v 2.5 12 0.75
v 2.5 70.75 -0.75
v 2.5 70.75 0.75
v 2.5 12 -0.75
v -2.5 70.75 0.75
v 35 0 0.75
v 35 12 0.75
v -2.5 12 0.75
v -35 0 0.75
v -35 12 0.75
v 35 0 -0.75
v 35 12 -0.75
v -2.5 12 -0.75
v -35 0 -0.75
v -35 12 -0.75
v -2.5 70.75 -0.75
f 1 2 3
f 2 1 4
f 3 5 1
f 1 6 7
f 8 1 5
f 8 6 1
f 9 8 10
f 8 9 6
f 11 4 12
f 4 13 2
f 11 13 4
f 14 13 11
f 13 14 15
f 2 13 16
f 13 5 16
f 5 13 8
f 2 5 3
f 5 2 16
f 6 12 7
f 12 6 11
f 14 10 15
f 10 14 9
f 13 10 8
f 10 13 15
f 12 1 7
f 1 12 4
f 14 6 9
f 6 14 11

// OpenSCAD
// Dimensions for the 10-well agarose gel comb
// All units in millimetres

// Overall Geometry
plate_thickness = 1.5;   // Thickness of the flat plate (Z)
spine_length = 70;       // Length of the spine (X)
spine_width = 12;        // Width of the spine (Y)

// Tooth Geometry
tooth_width = 5.0;       // Width of a single tooth (X)
tooth_length = 12;       // Length of a single tooth (Y)
tooth_gap = 1.5;         // Gap between neighbouring teeth (Y)

// Positioning
num_teeth = 10;          // Number of teeth on the comb
tooth_offset = 0.25;     // Offset of the first tooth from the spine edge (Y)

// Rendering
$fn = 64;               // High resolution for curved surfaces

// Main Body
module gel_comb() {
    union() {
        // The Spine (Back bar)
        translate([0, spine_width / 2, 0])
            cube([spine_length, spine_width, plate_thickness], center = true);

        // The Teeth
        // Calculate total width occupied by teeth and gaps
        total_teeth_width = num_teeth * tooth_width;
        total_gaps_width = (num_teeth - 1) * tooth_gap;
        total_row_width = total_teeth_width + total_gaps_width;

        // Calculate starting Y position to center the row of teeth
        // The row starts at the edge of the spine (Y = spine_width/2)
        // and extends into -Y.
        start_y = (spine_width / 2) + tooth_offset;

        for (i = [0 : num_teeth - 1]) {
            // Calculate Y position for each tooth
            // The first tooth is at start_y, the next is start_y + tooth_width + tooth_gap, etc.
            current_y = start_y + i * (tooth_width + tooth_gap);

            translate([0, current_y, 0])
                cube([tooth_width, tooth_length, plate_thickness], center = true);
        }
    }
}

// Render the part
gel_comb();
